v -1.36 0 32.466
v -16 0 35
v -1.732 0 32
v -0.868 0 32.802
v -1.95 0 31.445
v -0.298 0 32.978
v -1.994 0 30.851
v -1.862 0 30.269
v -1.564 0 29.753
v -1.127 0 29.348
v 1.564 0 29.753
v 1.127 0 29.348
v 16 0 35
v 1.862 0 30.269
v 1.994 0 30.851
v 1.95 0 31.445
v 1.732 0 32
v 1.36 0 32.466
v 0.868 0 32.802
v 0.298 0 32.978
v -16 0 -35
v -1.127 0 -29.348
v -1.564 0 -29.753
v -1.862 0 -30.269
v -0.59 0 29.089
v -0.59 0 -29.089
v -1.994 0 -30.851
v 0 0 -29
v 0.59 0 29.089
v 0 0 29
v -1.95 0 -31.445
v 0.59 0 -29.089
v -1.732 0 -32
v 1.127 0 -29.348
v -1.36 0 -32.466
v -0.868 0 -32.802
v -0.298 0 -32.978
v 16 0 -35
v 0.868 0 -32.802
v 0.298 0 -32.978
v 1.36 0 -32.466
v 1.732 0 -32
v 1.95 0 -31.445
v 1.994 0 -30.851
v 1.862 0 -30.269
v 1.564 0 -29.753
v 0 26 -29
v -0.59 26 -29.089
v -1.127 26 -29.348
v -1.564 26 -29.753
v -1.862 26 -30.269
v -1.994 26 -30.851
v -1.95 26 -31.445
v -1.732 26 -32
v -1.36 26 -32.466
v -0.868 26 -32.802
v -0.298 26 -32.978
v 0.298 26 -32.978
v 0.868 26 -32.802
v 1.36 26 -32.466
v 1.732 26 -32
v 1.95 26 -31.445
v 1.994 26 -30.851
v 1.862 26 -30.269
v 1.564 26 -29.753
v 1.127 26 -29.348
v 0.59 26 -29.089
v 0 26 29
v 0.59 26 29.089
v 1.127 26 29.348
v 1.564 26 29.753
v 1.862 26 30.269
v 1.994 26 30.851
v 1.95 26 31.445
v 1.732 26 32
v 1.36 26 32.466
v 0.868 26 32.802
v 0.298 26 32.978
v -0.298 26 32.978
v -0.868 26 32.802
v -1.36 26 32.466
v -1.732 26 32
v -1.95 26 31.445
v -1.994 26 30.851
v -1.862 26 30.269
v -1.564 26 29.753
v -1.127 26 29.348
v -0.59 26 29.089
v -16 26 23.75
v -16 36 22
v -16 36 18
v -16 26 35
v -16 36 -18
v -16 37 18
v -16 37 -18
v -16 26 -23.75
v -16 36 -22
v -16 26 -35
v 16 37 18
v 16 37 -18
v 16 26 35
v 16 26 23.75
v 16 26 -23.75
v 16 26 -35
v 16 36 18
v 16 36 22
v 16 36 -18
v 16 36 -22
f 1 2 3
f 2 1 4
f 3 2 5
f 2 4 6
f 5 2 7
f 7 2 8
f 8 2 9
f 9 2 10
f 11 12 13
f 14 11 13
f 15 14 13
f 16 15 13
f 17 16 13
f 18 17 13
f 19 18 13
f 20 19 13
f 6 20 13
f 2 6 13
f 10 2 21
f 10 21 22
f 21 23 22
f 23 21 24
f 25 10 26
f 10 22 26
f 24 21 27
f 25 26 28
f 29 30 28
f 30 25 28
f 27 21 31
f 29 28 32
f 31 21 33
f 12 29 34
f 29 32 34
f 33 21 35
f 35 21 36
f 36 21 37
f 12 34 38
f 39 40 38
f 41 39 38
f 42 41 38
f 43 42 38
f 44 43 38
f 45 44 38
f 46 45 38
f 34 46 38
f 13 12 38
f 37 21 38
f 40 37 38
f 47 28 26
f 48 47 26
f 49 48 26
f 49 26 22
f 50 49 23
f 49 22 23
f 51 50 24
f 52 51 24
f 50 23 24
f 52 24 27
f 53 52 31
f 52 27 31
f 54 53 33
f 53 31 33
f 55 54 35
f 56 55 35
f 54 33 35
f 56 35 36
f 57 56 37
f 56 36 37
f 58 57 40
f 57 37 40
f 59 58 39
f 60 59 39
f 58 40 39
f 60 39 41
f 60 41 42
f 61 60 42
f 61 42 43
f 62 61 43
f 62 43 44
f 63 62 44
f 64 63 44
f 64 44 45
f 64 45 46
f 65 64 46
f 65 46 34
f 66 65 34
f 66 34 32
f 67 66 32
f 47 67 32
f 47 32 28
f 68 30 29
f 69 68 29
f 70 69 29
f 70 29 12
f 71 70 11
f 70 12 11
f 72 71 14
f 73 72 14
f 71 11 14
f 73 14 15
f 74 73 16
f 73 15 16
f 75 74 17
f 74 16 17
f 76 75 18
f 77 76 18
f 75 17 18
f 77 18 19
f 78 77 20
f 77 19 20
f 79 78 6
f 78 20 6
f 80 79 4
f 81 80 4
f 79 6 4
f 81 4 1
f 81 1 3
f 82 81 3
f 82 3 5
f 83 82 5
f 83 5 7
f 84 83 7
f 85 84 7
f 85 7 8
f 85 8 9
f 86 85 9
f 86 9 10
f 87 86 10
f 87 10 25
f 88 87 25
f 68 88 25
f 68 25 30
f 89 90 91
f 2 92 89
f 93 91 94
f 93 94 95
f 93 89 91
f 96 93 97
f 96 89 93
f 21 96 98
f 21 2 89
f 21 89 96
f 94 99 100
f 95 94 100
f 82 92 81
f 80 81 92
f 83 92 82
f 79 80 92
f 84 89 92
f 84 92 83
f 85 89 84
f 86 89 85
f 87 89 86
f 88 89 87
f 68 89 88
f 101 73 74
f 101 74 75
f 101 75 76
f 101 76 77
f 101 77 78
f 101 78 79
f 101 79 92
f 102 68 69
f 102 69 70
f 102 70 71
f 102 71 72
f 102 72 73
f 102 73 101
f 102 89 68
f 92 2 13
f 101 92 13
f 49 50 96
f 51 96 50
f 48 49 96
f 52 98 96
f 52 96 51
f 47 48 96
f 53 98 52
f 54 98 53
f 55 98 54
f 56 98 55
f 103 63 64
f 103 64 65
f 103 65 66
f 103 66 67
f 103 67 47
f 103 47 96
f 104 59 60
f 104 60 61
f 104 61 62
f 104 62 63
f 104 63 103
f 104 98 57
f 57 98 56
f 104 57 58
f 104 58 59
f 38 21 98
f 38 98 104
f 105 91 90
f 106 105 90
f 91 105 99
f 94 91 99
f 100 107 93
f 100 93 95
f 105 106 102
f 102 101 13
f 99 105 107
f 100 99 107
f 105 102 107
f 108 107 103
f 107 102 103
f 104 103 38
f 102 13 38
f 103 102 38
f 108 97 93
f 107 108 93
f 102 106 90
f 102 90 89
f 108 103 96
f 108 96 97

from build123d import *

# Parameters (mm, degrees)
SKETCH_1_W          = 32
SKETCH_1_H          = 70
EXTRUDE_1_DEPTH     = 26
SKETCH_2_W          = 36
SKETCH_2_H          = 1
EXTRUDE_2_DEPTH     = 32
SKETCH_3_R          = 2
CUT_EXTRUDE_1_DEPTH = 54.38539126


with BuildPart() as part:
    # ｽｹｯﾁ1 → ﾎﾞｽ - 押し出し1 (new body)
    with BuildSketch(Plane(origin=(0, 0, 0), x_dir=(1, 0, 0), z_dir=(0, 1, 0))):
        Rectangle(SKETCH_1_W, SKETCH_1_H)
    extrude(amount=EXTRUDE_1_DEPTH)

    # ｽｹｯﾁ2 → ﾎﾞｽ - 押し出し2 (add)
    with BuildSketch(Plane(origin=(16, 0, 0), x_dir=(0, 0, -1), z_dir=(1, 0, 0))):
        Polygon((-18, 36), (-22, 36), (-22, 26), (22, 26), (22, 36), (18, 36), align=None)
        with Locations((0, 36.5)):
            Rectangle(SKETCH_2_W, SKETCH_2_H)
        Polygon((-22, 26), (-22, 36), (-23.75, 26), align=None)
        Polygon((22, 36), (22, 26), (23.75, 26), align=None)
    extrude(amount=-EXTRUDE_2_DEPTH)

    # ｽｹｯﾁ3 → ｶｯﾄ - 押し出し1 (cut, through all)
    with BuildSketch(Plane.XZ):
        with Locations(Location((0, 31, 0), (0, 0, 270))):
            Circle(SKETCH_3_R)
        with Locations(Location((0, -31, 0), (0, 0, 90))):
            Circle(SKETCH_3_R)
    extrude(amount=-CUT_EXTRUDE_1_DEPTH, mode=Mode.SUBTRACT)


solid = part.part
